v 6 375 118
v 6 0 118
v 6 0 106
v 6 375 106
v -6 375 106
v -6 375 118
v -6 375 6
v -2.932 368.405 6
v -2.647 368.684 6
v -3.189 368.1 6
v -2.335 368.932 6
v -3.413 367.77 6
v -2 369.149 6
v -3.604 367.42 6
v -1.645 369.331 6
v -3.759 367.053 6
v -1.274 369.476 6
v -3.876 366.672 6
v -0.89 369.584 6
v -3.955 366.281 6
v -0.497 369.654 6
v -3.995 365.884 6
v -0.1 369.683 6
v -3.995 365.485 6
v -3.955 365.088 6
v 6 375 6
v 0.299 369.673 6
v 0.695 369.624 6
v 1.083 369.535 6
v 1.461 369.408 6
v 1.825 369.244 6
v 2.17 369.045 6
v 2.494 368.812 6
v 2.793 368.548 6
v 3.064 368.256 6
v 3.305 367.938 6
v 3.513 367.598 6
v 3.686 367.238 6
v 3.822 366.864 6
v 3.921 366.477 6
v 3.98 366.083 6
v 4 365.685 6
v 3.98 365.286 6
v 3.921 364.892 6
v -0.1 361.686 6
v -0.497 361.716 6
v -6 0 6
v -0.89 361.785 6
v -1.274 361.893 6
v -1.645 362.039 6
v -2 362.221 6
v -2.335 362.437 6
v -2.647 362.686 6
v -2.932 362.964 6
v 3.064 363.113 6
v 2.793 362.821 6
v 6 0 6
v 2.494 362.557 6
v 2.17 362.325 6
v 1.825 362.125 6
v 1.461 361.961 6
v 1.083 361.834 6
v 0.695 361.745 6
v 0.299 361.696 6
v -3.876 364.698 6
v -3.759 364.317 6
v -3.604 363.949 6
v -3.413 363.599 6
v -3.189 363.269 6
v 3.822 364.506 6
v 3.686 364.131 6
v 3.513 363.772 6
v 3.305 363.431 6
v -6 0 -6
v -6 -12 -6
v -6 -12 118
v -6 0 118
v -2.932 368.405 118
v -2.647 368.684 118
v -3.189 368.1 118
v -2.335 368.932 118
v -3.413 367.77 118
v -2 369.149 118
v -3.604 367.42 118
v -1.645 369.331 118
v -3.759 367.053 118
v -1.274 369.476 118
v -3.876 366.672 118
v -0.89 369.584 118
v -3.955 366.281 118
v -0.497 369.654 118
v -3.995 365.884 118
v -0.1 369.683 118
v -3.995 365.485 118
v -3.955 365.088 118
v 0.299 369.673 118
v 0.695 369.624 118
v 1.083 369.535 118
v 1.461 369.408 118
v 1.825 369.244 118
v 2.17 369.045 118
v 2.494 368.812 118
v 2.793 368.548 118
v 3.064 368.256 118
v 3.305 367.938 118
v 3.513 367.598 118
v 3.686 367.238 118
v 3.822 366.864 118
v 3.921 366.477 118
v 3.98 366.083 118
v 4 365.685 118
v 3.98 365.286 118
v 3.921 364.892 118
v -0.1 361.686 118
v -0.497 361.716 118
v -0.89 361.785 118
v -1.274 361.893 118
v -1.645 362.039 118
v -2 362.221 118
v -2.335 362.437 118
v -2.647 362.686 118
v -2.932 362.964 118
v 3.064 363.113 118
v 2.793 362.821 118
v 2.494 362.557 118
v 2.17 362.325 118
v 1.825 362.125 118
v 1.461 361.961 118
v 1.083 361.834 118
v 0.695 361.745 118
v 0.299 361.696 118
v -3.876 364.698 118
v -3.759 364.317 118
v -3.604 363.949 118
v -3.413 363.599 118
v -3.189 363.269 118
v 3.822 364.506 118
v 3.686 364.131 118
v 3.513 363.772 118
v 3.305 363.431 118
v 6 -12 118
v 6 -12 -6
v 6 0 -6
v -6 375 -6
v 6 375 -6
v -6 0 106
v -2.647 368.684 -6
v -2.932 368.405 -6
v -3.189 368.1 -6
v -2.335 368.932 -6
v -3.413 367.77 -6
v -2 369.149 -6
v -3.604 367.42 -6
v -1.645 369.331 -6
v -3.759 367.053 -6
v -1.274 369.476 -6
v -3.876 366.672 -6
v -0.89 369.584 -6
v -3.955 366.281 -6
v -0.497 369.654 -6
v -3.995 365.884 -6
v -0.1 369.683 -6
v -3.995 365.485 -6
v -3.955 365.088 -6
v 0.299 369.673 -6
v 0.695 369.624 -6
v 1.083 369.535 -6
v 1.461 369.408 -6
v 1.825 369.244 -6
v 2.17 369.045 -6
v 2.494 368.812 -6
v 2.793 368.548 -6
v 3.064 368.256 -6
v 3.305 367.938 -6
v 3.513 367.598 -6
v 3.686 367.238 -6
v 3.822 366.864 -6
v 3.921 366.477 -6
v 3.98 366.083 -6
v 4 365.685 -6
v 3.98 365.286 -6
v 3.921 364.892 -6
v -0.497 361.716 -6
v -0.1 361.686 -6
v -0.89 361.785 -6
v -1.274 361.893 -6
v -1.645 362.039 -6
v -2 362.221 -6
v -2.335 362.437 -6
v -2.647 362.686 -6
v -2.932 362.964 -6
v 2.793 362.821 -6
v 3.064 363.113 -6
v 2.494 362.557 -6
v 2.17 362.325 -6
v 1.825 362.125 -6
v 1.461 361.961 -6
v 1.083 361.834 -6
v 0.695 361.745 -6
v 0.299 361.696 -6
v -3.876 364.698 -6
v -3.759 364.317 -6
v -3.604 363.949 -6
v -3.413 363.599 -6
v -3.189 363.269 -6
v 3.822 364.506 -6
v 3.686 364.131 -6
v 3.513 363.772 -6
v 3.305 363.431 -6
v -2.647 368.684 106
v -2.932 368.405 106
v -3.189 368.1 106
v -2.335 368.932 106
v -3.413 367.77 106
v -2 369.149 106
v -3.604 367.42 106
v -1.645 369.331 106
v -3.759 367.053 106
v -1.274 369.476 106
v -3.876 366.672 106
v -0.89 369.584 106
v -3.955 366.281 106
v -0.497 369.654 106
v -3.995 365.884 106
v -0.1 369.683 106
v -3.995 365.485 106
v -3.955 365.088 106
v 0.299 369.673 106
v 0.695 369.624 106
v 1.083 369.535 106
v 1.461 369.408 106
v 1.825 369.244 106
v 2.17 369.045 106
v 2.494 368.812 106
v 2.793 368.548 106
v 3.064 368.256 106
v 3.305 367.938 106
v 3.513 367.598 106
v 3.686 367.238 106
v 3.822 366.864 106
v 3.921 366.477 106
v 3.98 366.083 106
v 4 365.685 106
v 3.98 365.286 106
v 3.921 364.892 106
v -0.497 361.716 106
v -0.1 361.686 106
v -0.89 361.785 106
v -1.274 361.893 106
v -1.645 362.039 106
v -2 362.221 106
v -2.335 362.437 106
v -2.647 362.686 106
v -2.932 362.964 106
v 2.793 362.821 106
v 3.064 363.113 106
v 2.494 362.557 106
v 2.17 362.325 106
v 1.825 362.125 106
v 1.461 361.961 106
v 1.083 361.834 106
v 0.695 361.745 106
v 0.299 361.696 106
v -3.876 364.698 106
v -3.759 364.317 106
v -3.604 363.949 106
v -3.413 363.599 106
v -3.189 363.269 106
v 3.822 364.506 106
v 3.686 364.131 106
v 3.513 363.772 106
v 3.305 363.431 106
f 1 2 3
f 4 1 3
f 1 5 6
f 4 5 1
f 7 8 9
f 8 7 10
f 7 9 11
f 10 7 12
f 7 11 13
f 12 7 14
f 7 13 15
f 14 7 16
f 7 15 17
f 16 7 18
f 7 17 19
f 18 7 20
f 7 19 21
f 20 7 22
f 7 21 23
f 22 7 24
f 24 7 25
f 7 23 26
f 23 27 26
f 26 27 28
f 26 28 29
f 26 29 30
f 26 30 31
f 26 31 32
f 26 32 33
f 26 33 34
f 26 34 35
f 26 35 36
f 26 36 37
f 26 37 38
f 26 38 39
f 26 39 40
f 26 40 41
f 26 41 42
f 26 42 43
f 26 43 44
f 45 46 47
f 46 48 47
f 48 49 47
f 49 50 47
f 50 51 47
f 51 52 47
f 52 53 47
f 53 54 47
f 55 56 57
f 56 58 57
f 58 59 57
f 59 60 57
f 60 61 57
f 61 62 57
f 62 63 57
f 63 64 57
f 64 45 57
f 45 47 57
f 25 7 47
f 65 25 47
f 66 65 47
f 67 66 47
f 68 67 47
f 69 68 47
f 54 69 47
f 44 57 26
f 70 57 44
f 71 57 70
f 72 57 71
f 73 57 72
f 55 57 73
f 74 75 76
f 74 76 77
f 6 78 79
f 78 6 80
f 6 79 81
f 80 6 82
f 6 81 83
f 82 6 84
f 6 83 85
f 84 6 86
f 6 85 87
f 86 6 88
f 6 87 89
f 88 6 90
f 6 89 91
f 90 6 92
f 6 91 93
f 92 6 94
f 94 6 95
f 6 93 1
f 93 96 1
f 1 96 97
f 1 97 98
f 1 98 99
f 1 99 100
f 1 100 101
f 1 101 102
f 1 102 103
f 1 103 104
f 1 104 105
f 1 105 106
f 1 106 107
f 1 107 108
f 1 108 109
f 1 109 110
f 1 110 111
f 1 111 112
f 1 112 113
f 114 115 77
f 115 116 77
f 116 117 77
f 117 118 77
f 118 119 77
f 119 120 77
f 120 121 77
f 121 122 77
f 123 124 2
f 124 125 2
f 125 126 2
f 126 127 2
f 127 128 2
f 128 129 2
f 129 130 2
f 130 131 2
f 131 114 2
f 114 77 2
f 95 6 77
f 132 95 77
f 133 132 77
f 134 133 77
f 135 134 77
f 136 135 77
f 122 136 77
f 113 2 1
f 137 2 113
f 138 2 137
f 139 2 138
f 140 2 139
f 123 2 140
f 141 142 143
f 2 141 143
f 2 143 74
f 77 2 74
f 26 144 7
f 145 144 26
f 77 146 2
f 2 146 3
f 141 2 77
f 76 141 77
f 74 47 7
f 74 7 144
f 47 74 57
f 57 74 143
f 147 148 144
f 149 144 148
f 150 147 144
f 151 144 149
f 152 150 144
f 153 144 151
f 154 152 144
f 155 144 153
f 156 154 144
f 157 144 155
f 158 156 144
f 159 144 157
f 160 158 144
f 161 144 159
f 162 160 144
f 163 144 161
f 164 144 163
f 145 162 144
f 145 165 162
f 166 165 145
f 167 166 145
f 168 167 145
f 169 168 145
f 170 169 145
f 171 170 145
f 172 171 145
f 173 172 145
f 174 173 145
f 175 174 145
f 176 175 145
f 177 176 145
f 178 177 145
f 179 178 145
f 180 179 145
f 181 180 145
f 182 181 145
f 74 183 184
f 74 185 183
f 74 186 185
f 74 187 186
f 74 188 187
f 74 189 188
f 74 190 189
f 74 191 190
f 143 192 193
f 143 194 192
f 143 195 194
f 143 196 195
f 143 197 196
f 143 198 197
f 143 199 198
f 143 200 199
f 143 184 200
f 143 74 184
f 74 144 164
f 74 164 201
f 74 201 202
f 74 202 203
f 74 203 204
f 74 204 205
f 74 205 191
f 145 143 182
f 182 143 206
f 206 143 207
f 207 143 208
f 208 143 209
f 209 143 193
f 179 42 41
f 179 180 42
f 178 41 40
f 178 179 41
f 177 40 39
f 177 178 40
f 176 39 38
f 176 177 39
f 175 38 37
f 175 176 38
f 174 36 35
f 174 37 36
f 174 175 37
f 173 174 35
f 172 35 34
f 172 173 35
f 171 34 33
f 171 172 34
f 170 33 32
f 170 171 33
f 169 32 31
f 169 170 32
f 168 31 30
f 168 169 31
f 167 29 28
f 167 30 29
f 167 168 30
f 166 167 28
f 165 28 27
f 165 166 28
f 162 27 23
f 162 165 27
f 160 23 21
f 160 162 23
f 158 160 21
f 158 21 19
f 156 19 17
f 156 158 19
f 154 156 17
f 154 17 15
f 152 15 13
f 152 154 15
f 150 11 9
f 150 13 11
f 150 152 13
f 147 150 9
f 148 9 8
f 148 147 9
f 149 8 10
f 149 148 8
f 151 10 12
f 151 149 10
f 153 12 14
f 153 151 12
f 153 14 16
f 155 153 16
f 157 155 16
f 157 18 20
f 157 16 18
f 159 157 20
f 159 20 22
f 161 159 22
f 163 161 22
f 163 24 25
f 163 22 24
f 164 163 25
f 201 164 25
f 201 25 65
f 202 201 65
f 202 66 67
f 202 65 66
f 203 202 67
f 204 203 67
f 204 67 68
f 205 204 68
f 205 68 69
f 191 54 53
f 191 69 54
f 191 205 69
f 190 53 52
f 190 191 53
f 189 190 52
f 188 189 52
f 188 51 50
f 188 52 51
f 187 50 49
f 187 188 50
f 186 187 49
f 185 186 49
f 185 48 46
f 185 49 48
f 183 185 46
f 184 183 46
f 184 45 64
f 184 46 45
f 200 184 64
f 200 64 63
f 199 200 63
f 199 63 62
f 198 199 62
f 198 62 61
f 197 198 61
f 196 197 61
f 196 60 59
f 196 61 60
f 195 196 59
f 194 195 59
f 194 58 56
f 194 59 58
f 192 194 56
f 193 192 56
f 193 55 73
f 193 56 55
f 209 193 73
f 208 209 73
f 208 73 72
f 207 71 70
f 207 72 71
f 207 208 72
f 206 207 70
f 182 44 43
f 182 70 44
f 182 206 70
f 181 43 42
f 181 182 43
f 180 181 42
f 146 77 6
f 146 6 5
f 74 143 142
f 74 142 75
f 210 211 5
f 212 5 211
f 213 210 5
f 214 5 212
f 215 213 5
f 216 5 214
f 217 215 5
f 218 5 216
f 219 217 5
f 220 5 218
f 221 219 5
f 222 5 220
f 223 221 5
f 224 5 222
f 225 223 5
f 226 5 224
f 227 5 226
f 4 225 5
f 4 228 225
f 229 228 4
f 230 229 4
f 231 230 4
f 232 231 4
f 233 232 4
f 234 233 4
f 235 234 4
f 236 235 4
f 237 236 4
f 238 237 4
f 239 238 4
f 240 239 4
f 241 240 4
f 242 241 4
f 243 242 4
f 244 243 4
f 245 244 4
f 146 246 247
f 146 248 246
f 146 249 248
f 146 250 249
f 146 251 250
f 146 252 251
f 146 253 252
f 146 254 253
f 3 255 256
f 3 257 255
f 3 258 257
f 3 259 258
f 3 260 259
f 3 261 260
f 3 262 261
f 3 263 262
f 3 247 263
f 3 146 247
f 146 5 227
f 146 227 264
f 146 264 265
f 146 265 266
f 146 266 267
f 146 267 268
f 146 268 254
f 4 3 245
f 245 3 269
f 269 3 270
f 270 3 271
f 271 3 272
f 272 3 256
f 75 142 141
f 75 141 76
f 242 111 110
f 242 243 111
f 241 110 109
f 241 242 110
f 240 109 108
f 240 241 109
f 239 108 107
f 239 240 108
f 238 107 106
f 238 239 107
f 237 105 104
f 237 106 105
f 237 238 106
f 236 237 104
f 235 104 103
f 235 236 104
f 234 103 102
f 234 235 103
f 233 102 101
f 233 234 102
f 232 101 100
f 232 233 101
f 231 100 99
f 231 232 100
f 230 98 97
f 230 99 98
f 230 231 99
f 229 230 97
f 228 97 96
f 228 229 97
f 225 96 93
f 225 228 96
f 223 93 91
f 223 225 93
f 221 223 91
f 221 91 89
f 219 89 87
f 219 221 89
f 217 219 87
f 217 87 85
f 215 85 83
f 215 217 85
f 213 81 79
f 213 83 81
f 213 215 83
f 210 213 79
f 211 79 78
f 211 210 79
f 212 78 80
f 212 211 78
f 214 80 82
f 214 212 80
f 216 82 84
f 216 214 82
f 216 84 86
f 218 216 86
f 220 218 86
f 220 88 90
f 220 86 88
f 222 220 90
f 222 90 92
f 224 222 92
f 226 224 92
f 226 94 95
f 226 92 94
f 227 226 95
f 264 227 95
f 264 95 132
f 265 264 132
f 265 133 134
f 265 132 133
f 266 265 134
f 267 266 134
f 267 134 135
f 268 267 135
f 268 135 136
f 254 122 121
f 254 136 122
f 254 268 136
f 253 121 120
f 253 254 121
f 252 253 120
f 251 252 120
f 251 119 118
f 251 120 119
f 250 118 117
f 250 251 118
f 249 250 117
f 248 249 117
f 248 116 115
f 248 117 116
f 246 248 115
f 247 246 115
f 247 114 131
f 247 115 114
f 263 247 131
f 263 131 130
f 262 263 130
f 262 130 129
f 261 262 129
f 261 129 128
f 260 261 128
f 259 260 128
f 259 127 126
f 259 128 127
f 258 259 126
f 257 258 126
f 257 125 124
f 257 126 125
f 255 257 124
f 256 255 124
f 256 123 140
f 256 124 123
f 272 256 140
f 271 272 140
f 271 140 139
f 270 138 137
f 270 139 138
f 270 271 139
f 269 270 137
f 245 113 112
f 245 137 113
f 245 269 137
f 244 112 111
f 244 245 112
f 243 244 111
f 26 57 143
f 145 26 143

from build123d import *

# Parameters (mm, degrees)
SKETCH1_W               = 12
SKETCH1_H               = 12
BOSS_EXTRUDE1_DEPTH     = 375
SKETCH3_W               = 12
SKETCH3_H               = 12
BOSS_EXTRUDE2_DEPTH     = 124
SKETCH4_W               = 12
SKETCH4_H               = 12
BOSS_EXTRUDE3_DEPTH     = 375
CUT_EXTRUDE2_DEPTH      = 392.414102965
CUT_EXTRUDE2_DEPTH_BACK = 392.414102965
SKETCH2_R               = 4


with BuildPart() as part:
    # Sketch1 → Boss-Extrude1 (new body)
    with BuildSketch(Plane(origin=(0, 0, 0), x_dir=(1, 0, 0), z_dir=(0, 1, 0))):
        Rectangle(SKETCH1_W, SKETCH1_H)
    extrude(amount=BOSS_EXTRUDE1_DEPTH)


with BuildPart() as body_2:
    # Sketch3 → Boss-Extrude2 (new body)
    with BuildSketch(Plane(origin=(0, 0, -6), x_dir=(-1, 0, 0), z_dir=(0, 0, -1))):
        with Locations((0, -6)):
            Rectangle(SKETCH3_W, SKETCH3_H)
    extrude(amount=-BOSS_EXTRUDE2_DEPTH)


with BuildPart() as body_3:
    # Sketch4 → Boss-Extrude3 (new body)
    with BuildSketch(Plane(origin=(0, 0, 0), x_dir=(1, 0, 0), z_dir=(0, 1, 0))):
        with Locations((0, -112)):
            Rectangle(SKETCH4_W, SKETCH4_H)
    extrude(amount=BOSS_EXTRUDE3_DEPTH)


with BuildPart() as cut_extrude2_tool:
    # Sketch2 → Cut-Extrude2 (new, two sides: drawn at the far end of the back side and taken through both)
    with BuildSketch(Plane.XY.offset(6).offset(-CUT_EXTRUDE2_DEPTH_BACK)):
        with Locations((0, 365.684639754)):
            Circle(SKETCH2_R)
    extrude(amount=CUT_EXTRUDE2_DEPTH + CUT_EXTRUDE2_DEPTH_BACK)


with BuildPart() as part_1:
    add(part.part)

    # Cut-Extrude2: cut by cut_extrude2_tool
    add(cut_extrude2_tool.part, mode=Mode.SUBTRACT)


with BuildPart() as body_3_1:
    add(body_3.part)

    # Cut-Extrude2: cut by cut_extrude2_tool
    add(cut_extrude2_tool.part, mode=Mode.SUBTRACT)


solid = Compound([body_2.part, part_1.part, body_3_1.part])
